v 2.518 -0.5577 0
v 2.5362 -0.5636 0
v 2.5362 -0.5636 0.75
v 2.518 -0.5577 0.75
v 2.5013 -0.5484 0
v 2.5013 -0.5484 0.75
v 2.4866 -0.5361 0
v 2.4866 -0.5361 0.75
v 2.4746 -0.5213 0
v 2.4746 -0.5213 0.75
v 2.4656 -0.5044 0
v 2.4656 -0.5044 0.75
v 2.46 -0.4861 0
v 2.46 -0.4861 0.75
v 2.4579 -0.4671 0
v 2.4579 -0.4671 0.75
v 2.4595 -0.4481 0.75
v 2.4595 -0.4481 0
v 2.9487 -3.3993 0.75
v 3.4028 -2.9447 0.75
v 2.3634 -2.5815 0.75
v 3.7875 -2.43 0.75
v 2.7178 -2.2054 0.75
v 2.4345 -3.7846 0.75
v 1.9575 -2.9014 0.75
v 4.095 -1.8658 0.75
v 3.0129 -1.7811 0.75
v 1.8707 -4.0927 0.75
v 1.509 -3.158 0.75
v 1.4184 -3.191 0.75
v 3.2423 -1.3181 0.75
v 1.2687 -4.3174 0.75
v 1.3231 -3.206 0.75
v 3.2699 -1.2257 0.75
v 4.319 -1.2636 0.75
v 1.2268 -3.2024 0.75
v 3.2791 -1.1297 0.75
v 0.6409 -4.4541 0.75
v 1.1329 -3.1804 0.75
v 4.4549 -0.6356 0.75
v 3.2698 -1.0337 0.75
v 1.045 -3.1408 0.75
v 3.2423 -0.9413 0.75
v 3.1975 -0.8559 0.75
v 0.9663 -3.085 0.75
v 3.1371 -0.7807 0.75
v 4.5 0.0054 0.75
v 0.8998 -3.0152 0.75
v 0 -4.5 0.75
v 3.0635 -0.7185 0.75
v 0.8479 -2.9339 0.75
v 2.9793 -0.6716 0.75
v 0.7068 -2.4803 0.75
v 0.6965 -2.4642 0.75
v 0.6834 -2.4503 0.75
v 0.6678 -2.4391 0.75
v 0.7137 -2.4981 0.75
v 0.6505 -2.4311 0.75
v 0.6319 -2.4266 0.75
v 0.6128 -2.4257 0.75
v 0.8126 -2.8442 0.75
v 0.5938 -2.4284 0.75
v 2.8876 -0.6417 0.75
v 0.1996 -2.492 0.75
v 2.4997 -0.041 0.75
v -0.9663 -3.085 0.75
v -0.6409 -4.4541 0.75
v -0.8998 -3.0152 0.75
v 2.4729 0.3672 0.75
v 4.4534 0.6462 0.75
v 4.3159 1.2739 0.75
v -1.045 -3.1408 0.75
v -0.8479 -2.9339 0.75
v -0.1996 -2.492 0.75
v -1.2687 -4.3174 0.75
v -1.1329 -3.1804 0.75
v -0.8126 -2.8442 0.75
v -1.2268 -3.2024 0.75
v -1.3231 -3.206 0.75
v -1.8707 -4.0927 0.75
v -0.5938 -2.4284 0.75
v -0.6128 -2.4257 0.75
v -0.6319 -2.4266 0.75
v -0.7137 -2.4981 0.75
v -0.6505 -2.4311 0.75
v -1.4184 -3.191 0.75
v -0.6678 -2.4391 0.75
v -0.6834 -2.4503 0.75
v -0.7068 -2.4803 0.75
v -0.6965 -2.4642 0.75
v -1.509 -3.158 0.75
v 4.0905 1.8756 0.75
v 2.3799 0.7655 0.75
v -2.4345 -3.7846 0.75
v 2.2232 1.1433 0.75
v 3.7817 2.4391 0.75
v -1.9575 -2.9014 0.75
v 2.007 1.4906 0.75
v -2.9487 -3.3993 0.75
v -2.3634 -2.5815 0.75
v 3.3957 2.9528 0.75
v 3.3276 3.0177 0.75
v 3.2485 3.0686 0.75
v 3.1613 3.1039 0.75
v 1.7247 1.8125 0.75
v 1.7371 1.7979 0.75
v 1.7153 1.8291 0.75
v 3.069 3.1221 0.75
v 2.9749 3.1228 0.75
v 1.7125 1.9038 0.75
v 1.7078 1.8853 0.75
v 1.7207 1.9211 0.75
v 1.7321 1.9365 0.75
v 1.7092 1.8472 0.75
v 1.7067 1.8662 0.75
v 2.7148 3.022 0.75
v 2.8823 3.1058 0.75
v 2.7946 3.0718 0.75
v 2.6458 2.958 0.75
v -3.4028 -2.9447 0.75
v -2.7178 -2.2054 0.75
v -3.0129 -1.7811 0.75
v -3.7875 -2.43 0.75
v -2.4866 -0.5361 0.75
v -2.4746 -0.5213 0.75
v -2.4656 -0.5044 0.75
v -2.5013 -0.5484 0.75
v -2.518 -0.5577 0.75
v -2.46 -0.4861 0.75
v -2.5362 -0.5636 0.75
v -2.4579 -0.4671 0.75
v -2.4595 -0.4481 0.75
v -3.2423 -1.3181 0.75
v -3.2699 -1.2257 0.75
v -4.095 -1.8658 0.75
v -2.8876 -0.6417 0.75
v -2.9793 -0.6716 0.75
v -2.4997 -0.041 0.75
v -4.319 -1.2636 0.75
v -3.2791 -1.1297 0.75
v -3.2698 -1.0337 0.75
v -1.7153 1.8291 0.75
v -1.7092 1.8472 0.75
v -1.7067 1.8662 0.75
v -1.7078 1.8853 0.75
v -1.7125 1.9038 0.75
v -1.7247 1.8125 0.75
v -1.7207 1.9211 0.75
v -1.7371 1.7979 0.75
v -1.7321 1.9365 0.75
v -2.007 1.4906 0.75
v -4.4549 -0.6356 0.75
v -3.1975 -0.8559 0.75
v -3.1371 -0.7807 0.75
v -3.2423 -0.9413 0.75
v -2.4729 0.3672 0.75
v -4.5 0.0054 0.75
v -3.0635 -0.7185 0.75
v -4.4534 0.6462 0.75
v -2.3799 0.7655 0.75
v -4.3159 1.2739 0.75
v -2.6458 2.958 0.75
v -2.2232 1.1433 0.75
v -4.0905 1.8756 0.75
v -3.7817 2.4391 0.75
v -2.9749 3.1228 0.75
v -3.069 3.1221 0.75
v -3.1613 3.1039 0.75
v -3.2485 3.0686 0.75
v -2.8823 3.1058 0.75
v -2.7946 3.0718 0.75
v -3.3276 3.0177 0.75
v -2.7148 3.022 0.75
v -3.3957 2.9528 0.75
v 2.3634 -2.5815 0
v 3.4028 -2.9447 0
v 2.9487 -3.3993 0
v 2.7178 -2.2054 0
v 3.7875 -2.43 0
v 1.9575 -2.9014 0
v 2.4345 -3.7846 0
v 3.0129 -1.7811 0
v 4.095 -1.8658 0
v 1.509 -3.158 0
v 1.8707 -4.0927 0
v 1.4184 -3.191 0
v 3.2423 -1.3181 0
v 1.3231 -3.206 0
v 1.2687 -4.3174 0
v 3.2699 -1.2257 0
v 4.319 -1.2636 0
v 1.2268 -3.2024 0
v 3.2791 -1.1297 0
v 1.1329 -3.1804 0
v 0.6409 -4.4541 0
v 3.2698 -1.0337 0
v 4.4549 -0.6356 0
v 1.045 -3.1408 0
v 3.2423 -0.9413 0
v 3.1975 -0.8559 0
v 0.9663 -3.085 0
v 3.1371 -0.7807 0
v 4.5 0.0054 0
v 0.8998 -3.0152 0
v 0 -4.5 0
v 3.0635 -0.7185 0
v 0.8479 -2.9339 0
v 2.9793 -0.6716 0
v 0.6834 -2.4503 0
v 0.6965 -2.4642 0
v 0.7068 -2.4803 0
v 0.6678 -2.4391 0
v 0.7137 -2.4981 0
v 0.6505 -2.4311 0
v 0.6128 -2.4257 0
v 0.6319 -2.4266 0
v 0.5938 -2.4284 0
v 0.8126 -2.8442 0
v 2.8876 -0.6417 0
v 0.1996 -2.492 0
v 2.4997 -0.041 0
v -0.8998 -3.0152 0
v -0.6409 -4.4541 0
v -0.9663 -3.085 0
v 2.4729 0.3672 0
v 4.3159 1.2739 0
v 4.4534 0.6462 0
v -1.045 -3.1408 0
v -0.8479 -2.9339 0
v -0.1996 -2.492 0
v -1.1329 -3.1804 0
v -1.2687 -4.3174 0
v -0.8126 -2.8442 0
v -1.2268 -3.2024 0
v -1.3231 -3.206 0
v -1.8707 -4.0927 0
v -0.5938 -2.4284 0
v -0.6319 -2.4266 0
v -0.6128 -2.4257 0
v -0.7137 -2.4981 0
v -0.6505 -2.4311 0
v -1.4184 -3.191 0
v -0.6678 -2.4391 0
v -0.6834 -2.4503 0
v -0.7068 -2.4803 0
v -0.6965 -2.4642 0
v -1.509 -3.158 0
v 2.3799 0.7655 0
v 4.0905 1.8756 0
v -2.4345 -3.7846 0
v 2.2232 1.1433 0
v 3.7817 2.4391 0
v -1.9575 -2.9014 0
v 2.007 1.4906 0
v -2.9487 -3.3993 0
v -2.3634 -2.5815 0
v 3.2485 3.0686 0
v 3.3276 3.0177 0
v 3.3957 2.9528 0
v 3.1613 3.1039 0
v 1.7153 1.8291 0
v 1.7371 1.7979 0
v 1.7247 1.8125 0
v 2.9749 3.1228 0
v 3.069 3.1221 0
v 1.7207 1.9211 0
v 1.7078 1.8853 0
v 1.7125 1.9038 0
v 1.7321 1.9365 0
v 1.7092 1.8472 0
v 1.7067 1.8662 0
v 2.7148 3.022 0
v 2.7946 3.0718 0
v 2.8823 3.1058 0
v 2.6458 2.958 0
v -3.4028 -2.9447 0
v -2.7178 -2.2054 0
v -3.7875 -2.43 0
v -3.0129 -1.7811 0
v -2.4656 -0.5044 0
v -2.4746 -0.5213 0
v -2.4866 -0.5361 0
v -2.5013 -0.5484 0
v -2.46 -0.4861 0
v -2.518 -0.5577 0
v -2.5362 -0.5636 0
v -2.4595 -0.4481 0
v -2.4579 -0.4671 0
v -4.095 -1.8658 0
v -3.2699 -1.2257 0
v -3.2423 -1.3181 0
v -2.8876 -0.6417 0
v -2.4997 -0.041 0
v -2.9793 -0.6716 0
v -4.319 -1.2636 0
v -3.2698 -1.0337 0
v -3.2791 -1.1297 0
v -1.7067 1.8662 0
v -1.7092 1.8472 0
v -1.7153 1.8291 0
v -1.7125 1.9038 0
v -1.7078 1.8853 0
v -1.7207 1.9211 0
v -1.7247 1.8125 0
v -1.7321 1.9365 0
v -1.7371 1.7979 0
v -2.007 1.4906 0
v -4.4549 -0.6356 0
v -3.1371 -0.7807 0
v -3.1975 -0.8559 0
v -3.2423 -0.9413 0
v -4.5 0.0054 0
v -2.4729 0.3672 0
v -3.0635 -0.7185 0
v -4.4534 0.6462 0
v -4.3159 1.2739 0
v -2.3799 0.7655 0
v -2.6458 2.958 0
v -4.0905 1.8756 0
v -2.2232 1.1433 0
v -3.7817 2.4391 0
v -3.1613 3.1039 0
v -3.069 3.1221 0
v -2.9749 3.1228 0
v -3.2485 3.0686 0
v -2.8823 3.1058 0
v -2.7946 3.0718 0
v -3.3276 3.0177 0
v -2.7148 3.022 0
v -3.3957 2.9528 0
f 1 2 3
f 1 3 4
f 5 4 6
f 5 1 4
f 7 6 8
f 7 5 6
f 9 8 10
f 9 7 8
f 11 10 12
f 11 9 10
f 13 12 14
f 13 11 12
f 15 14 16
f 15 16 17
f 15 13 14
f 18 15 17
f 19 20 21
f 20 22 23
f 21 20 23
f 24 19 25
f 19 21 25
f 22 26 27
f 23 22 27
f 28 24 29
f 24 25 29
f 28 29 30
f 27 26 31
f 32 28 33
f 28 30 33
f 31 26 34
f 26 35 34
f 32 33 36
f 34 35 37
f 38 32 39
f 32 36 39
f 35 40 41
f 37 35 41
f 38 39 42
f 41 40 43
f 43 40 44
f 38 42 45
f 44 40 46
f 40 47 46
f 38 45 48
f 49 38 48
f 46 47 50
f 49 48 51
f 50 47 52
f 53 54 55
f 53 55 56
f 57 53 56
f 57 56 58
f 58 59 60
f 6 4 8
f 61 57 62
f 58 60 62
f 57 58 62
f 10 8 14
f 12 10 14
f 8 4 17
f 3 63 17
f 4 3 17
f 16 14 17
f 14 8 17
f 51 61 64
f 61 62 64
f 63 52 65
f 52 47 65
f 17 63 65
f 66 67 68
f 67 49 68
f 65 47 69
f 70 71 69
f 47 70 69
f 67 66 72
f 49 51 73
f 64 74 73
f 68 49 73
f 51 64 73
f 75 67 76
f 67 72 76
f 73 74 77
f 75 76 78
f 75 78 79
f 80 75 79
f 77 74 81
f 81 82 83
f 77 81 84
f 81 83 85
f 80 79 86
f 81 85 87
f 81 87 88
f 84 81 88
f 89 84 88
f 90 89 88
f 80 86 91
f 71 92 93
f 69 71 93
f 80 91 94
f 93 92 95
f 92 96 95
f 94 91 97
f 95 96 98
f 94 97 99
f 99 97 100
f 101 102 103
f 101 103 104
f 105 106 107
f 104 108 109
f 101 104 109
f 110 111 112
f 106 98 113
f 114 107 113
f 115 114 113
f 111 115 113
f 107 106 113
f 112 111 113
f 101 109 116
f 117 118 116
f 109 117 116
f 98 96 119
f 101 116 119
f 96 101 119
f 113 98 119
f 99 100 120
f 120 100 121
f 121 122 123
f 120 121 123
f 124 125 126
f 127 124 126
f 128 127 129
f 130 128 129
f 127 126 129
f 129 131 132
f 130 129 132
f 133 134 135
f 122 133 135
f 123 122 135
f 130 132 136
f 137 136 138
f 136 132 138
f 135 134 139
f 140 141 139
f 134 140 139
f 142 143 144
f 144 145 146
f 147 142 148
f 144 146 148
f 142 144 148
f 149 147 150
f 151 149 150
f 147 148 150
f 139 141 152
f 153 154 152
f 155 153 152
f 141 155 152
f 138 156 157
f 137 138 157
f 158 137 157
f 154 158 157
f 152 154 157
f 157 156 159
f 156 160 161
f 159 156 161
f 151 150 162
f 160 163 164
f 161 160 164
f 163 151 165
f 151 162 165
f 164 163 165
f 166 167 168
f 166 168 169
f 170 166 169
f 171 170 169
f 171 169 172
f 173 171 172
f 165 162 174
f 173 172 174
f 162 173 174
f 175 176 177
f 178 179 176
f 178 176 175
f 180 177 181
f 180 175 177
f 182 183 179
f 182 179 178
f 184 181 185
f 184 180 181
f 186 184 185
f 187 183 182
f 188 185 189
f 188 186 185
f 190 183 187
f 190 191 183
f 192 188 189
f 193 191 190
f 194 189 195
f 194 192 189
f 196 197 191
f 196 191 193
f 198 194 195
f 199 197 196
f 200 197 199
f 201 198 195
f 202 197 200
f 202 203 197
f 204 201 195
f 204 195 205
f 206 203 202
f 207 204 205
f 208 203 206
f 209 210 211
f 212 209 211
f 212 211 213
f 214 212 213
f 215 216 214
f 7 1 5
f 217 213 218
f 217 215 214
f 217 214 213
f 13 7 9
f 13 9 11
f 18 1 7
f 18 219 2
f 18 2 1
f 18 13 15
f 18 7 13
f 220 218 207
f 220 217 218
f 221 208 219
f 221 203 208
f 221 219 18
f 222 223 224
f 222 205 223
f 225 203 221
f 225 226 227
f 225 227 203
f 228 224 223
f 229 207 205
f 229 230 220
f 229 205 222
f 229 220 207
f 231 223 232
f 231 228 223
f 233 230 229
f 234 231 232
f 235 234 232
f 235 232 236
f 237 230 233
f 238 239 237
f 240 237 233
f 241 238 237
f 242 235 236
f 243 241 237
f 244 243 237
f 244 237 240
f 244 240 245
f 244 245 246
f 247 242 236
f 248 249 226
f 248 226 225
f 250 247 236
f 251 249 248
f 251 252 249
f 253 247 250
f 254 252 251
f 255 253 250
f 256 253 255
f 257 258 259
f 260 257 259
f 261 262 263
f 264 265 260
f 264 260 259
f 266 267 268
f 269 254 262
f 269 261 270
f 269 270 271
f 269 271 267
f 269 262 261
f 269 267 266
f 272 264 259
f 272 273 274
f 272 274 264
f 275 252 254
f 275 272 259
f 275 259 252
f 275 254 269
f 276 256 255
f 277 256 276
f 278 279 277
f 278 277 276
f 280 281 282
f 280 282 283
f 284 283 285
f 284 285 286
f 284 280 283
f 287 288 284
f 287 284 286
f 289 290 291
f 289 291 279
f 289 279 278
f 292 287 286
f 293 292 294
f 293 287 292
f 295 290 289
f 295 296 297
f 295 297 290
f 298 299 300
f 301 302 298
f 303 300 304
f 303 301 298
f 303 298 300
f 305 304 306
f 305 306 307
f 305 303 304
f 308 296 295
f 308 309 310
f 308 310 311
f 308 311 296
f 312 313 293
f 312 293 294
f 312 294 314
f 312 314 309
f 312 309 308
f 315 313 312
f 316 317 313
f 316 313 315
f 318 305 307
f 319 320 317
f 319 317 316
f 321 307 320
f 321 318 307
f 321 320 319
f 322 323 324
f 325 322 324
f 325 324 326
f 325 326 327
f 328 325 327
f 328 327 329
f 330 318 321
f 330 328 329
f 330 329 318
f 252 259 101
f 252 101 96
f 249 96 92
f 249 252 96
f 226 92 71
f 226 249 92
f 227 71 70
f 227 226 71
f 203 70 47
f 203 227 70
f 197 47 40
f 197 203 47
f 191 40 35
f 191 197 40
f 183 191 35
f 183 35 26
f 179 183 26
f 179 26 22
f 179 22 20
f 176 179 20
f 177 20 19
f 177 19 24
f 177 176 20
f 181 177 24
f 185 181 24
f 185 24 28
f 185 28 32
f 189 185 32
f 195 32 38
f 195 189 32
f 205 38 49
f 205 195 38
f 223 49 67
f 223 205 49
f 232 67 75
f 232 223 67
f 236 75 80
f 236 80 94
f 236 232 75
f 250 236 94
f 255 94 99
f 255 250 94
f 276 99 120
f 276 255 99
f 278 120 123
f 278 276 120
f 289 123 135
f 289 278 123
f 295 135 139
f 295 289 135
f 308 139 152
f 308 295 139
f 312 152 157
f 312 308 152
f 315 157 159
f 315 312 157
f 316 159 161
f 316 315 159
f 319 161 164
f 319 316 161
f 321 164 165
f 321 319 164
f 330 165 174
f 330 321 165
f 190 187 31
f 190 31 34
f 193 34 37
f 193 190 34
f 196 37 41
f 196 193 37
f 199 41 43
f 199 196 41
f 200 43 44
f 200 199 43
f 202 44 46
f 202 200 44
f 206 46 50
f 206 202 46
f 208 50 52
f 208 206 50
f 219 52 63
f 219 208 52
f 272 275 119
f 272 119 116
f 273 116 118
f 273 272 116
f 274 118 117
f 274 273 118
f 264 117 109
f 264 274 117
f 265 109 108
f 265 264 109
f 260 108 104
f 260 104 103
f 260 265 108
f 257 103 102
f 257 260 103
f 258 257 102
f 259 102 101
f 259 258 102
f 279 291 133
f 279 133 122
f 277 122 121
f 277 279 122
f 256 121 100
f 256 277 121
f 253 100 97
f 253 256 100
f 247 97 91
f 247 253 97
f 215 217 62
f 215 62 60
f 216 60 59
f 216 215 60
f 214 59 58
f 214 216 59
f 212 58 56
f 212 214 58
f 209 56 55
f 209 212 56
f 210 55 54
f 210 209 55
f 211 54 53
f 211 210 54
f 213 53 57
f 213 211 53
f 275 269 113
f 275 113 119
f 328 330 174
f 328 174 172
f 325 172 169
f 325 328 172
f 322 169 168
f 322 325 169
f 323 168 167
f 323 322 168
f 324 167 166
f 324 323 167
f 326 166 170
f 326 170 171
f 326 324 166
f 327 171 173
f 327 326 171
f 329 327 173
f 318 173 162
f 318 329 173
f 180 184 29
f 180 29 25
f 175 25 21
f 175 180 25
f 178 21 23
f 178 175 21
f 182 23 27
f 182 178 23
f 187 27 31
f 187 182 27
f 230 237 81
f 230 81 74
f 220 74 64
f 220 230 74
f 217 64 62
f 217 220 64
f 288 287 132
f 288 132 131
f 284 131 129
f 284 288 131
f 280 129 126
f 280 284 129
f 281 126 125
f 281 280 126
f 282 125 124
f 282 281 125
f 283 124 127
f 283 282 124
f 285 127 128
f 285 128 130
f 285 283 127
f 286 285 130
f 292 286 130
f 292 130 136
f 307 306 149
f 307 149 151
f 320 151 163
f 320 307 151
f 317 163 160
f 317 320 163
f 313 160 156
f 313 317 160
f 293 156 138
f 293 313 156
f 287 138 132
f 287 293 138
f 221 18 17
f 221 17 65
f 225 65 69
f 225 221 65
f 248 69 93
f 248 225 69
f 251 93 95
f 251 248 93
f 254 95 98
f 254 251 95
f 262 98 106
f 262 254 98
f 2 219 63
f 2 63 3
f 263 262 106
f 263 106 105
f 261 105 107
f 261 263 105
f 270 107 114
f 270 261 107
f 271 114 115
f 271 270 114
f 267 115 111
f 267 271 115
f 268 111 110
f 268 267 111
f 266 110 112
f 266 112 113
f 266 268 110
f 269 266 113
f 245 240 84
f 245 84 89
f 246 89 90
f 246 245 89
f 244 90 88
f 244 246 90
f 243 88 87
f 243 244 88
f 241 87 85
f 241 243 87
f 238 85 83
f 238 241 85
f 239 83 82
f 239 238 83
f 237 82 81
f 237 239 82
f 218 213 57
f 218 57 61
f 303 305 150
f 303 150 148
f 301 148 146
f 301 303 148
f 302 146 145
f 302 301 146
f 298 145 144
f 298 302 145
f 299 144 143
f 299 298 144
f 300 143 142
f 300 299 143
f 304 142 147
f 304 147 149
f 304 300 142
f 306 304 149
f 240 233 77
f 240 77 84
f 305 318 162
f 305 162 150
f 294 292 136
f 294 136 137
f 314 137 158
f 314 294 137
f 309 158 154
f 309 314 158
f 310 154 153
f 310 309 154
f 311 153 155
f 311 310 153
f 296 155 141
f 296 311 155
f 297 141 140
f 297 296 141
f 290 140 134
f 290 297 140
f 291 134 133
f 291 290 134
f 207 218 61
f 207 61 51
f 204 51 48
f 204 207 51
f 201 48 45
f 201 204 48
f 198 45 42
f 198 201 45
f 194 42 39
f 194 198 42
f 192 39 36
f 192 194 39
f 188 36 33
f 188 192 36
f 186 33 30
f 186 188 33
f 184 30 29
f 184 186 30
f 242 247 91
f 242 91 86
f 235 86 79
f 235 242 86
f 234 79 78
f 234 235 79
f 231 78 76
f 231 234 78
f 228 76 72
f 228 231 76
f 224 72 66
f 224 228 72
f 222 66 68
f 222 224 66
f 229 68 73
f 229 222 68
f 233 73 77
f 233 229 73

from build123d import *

# Parameters (mm, degrees)
ESTRUSIONE_ESTRUSIONE1_DEPTH = 0.75


with BuildPart() as part:
    # Schizzo1 → Estrusione-Estrusione1 (new body)
    with BuildSketch(Plane.XY):
        with BuildLine():
            Line((0.713746427, -2.498112495), (0.812636055, -2.844226194))
            ThreePointArc((0.812636055, -2.844226194), (1.087978373, -3.162719515), (1.508964367, -3.158009901))
            ThreePointArc((1.508964367, -3.158009901), (2.5475521, -2.399995479), (3.24232421, -1.318079558))
            ThreePointArc((3.24232421, -1.318079558), (3.221936632, -0.897561146), (2.887600266, -0.641688948))
            Line((2.887600266, -0.641688948), (2.536208379, -0.563601862))
            ThreePointArc((2.536208379, -0.563601862), (2.474583527, -0.521283499), (2.459520601, -0.448060727))
            ThreePointArc((2.459520601, -0.448060727), (2.37991714, 0.765502714), (1.737102314, 1.79790866))
            ThreePointArc((1.737102314, 1.79790866), (1.706652775, 1.866182313), (1.732050808, 1.936491673))
            Line((1.732050808, 1.936491673), (2.645751311, 2.958039892))
            ThreePointArc((2.645751311, 2.958039892), (3.021925983, 3.124694331), (3.395732971, 2.952794878))
            ThreePointArc((3.395732971, 2.952794878), (0, -4.5), (-3.395732971, 2.952794878))
            ThreePointArc((-3.395732971, 2.952794878), (-3.021925983, 3.124694331), (-2.645751311, 2.958039892))
            Line((-2.645751311, 2.958039892), (-1.732050808, 1.936491673))
            ThreePointArc((-1.732050808, 1.936491673), (-1.706652775, 1.866182313), (-1.737102314, 1.79790866))
            ThreePointArc((-1.737102314, 1.79790866), (-2.37991714, 0.765502714), (-2.459520601, -0.448060727))
            ThreePointArc((-2.459520601, -0.448060727), (-2.474583527, -0.521283499), (-2.536208379, -0.563601862))
            Line((-2.536208379, -0.563601862), (-2.887600266, -0.641688948))
            ThreePointArc((-2.887600266, -0.641688948), (-3.221936632, -0.897561146), (-3.24232421, -1.318079558))
            ThreePointArc((-3.24232421, -1.318079558), (-2.5475521, -2.399995479), (-1.508964367, -3.158009901))
            ThreePointArc((-1.508964367, -3.158009901), (-1.087978373, -3.162719515), (-0.812636055, -2.844226194))
            Line((-0.812636055, -2.844226194), (-0.713746427, -2.498112495))
            ThreePointArc((-0.713746427, -2.498112495), (-0.667830724, -2.439119153), (-0.593840416, -2.428446738))
            ThreePointArc((-0.593840416, -2.428446738), (0, -2.5), (0.593840416, -2.428446738))
            ThreePointArc((0.593840416, -2.428446738), (0.667830724, -2.439119153), (0.713746427, -2.498112495))
        make_face()
    extrude(amount=ESTRUSIONE_ESTRUSIONE1_DEPTH)


solid = part.part
